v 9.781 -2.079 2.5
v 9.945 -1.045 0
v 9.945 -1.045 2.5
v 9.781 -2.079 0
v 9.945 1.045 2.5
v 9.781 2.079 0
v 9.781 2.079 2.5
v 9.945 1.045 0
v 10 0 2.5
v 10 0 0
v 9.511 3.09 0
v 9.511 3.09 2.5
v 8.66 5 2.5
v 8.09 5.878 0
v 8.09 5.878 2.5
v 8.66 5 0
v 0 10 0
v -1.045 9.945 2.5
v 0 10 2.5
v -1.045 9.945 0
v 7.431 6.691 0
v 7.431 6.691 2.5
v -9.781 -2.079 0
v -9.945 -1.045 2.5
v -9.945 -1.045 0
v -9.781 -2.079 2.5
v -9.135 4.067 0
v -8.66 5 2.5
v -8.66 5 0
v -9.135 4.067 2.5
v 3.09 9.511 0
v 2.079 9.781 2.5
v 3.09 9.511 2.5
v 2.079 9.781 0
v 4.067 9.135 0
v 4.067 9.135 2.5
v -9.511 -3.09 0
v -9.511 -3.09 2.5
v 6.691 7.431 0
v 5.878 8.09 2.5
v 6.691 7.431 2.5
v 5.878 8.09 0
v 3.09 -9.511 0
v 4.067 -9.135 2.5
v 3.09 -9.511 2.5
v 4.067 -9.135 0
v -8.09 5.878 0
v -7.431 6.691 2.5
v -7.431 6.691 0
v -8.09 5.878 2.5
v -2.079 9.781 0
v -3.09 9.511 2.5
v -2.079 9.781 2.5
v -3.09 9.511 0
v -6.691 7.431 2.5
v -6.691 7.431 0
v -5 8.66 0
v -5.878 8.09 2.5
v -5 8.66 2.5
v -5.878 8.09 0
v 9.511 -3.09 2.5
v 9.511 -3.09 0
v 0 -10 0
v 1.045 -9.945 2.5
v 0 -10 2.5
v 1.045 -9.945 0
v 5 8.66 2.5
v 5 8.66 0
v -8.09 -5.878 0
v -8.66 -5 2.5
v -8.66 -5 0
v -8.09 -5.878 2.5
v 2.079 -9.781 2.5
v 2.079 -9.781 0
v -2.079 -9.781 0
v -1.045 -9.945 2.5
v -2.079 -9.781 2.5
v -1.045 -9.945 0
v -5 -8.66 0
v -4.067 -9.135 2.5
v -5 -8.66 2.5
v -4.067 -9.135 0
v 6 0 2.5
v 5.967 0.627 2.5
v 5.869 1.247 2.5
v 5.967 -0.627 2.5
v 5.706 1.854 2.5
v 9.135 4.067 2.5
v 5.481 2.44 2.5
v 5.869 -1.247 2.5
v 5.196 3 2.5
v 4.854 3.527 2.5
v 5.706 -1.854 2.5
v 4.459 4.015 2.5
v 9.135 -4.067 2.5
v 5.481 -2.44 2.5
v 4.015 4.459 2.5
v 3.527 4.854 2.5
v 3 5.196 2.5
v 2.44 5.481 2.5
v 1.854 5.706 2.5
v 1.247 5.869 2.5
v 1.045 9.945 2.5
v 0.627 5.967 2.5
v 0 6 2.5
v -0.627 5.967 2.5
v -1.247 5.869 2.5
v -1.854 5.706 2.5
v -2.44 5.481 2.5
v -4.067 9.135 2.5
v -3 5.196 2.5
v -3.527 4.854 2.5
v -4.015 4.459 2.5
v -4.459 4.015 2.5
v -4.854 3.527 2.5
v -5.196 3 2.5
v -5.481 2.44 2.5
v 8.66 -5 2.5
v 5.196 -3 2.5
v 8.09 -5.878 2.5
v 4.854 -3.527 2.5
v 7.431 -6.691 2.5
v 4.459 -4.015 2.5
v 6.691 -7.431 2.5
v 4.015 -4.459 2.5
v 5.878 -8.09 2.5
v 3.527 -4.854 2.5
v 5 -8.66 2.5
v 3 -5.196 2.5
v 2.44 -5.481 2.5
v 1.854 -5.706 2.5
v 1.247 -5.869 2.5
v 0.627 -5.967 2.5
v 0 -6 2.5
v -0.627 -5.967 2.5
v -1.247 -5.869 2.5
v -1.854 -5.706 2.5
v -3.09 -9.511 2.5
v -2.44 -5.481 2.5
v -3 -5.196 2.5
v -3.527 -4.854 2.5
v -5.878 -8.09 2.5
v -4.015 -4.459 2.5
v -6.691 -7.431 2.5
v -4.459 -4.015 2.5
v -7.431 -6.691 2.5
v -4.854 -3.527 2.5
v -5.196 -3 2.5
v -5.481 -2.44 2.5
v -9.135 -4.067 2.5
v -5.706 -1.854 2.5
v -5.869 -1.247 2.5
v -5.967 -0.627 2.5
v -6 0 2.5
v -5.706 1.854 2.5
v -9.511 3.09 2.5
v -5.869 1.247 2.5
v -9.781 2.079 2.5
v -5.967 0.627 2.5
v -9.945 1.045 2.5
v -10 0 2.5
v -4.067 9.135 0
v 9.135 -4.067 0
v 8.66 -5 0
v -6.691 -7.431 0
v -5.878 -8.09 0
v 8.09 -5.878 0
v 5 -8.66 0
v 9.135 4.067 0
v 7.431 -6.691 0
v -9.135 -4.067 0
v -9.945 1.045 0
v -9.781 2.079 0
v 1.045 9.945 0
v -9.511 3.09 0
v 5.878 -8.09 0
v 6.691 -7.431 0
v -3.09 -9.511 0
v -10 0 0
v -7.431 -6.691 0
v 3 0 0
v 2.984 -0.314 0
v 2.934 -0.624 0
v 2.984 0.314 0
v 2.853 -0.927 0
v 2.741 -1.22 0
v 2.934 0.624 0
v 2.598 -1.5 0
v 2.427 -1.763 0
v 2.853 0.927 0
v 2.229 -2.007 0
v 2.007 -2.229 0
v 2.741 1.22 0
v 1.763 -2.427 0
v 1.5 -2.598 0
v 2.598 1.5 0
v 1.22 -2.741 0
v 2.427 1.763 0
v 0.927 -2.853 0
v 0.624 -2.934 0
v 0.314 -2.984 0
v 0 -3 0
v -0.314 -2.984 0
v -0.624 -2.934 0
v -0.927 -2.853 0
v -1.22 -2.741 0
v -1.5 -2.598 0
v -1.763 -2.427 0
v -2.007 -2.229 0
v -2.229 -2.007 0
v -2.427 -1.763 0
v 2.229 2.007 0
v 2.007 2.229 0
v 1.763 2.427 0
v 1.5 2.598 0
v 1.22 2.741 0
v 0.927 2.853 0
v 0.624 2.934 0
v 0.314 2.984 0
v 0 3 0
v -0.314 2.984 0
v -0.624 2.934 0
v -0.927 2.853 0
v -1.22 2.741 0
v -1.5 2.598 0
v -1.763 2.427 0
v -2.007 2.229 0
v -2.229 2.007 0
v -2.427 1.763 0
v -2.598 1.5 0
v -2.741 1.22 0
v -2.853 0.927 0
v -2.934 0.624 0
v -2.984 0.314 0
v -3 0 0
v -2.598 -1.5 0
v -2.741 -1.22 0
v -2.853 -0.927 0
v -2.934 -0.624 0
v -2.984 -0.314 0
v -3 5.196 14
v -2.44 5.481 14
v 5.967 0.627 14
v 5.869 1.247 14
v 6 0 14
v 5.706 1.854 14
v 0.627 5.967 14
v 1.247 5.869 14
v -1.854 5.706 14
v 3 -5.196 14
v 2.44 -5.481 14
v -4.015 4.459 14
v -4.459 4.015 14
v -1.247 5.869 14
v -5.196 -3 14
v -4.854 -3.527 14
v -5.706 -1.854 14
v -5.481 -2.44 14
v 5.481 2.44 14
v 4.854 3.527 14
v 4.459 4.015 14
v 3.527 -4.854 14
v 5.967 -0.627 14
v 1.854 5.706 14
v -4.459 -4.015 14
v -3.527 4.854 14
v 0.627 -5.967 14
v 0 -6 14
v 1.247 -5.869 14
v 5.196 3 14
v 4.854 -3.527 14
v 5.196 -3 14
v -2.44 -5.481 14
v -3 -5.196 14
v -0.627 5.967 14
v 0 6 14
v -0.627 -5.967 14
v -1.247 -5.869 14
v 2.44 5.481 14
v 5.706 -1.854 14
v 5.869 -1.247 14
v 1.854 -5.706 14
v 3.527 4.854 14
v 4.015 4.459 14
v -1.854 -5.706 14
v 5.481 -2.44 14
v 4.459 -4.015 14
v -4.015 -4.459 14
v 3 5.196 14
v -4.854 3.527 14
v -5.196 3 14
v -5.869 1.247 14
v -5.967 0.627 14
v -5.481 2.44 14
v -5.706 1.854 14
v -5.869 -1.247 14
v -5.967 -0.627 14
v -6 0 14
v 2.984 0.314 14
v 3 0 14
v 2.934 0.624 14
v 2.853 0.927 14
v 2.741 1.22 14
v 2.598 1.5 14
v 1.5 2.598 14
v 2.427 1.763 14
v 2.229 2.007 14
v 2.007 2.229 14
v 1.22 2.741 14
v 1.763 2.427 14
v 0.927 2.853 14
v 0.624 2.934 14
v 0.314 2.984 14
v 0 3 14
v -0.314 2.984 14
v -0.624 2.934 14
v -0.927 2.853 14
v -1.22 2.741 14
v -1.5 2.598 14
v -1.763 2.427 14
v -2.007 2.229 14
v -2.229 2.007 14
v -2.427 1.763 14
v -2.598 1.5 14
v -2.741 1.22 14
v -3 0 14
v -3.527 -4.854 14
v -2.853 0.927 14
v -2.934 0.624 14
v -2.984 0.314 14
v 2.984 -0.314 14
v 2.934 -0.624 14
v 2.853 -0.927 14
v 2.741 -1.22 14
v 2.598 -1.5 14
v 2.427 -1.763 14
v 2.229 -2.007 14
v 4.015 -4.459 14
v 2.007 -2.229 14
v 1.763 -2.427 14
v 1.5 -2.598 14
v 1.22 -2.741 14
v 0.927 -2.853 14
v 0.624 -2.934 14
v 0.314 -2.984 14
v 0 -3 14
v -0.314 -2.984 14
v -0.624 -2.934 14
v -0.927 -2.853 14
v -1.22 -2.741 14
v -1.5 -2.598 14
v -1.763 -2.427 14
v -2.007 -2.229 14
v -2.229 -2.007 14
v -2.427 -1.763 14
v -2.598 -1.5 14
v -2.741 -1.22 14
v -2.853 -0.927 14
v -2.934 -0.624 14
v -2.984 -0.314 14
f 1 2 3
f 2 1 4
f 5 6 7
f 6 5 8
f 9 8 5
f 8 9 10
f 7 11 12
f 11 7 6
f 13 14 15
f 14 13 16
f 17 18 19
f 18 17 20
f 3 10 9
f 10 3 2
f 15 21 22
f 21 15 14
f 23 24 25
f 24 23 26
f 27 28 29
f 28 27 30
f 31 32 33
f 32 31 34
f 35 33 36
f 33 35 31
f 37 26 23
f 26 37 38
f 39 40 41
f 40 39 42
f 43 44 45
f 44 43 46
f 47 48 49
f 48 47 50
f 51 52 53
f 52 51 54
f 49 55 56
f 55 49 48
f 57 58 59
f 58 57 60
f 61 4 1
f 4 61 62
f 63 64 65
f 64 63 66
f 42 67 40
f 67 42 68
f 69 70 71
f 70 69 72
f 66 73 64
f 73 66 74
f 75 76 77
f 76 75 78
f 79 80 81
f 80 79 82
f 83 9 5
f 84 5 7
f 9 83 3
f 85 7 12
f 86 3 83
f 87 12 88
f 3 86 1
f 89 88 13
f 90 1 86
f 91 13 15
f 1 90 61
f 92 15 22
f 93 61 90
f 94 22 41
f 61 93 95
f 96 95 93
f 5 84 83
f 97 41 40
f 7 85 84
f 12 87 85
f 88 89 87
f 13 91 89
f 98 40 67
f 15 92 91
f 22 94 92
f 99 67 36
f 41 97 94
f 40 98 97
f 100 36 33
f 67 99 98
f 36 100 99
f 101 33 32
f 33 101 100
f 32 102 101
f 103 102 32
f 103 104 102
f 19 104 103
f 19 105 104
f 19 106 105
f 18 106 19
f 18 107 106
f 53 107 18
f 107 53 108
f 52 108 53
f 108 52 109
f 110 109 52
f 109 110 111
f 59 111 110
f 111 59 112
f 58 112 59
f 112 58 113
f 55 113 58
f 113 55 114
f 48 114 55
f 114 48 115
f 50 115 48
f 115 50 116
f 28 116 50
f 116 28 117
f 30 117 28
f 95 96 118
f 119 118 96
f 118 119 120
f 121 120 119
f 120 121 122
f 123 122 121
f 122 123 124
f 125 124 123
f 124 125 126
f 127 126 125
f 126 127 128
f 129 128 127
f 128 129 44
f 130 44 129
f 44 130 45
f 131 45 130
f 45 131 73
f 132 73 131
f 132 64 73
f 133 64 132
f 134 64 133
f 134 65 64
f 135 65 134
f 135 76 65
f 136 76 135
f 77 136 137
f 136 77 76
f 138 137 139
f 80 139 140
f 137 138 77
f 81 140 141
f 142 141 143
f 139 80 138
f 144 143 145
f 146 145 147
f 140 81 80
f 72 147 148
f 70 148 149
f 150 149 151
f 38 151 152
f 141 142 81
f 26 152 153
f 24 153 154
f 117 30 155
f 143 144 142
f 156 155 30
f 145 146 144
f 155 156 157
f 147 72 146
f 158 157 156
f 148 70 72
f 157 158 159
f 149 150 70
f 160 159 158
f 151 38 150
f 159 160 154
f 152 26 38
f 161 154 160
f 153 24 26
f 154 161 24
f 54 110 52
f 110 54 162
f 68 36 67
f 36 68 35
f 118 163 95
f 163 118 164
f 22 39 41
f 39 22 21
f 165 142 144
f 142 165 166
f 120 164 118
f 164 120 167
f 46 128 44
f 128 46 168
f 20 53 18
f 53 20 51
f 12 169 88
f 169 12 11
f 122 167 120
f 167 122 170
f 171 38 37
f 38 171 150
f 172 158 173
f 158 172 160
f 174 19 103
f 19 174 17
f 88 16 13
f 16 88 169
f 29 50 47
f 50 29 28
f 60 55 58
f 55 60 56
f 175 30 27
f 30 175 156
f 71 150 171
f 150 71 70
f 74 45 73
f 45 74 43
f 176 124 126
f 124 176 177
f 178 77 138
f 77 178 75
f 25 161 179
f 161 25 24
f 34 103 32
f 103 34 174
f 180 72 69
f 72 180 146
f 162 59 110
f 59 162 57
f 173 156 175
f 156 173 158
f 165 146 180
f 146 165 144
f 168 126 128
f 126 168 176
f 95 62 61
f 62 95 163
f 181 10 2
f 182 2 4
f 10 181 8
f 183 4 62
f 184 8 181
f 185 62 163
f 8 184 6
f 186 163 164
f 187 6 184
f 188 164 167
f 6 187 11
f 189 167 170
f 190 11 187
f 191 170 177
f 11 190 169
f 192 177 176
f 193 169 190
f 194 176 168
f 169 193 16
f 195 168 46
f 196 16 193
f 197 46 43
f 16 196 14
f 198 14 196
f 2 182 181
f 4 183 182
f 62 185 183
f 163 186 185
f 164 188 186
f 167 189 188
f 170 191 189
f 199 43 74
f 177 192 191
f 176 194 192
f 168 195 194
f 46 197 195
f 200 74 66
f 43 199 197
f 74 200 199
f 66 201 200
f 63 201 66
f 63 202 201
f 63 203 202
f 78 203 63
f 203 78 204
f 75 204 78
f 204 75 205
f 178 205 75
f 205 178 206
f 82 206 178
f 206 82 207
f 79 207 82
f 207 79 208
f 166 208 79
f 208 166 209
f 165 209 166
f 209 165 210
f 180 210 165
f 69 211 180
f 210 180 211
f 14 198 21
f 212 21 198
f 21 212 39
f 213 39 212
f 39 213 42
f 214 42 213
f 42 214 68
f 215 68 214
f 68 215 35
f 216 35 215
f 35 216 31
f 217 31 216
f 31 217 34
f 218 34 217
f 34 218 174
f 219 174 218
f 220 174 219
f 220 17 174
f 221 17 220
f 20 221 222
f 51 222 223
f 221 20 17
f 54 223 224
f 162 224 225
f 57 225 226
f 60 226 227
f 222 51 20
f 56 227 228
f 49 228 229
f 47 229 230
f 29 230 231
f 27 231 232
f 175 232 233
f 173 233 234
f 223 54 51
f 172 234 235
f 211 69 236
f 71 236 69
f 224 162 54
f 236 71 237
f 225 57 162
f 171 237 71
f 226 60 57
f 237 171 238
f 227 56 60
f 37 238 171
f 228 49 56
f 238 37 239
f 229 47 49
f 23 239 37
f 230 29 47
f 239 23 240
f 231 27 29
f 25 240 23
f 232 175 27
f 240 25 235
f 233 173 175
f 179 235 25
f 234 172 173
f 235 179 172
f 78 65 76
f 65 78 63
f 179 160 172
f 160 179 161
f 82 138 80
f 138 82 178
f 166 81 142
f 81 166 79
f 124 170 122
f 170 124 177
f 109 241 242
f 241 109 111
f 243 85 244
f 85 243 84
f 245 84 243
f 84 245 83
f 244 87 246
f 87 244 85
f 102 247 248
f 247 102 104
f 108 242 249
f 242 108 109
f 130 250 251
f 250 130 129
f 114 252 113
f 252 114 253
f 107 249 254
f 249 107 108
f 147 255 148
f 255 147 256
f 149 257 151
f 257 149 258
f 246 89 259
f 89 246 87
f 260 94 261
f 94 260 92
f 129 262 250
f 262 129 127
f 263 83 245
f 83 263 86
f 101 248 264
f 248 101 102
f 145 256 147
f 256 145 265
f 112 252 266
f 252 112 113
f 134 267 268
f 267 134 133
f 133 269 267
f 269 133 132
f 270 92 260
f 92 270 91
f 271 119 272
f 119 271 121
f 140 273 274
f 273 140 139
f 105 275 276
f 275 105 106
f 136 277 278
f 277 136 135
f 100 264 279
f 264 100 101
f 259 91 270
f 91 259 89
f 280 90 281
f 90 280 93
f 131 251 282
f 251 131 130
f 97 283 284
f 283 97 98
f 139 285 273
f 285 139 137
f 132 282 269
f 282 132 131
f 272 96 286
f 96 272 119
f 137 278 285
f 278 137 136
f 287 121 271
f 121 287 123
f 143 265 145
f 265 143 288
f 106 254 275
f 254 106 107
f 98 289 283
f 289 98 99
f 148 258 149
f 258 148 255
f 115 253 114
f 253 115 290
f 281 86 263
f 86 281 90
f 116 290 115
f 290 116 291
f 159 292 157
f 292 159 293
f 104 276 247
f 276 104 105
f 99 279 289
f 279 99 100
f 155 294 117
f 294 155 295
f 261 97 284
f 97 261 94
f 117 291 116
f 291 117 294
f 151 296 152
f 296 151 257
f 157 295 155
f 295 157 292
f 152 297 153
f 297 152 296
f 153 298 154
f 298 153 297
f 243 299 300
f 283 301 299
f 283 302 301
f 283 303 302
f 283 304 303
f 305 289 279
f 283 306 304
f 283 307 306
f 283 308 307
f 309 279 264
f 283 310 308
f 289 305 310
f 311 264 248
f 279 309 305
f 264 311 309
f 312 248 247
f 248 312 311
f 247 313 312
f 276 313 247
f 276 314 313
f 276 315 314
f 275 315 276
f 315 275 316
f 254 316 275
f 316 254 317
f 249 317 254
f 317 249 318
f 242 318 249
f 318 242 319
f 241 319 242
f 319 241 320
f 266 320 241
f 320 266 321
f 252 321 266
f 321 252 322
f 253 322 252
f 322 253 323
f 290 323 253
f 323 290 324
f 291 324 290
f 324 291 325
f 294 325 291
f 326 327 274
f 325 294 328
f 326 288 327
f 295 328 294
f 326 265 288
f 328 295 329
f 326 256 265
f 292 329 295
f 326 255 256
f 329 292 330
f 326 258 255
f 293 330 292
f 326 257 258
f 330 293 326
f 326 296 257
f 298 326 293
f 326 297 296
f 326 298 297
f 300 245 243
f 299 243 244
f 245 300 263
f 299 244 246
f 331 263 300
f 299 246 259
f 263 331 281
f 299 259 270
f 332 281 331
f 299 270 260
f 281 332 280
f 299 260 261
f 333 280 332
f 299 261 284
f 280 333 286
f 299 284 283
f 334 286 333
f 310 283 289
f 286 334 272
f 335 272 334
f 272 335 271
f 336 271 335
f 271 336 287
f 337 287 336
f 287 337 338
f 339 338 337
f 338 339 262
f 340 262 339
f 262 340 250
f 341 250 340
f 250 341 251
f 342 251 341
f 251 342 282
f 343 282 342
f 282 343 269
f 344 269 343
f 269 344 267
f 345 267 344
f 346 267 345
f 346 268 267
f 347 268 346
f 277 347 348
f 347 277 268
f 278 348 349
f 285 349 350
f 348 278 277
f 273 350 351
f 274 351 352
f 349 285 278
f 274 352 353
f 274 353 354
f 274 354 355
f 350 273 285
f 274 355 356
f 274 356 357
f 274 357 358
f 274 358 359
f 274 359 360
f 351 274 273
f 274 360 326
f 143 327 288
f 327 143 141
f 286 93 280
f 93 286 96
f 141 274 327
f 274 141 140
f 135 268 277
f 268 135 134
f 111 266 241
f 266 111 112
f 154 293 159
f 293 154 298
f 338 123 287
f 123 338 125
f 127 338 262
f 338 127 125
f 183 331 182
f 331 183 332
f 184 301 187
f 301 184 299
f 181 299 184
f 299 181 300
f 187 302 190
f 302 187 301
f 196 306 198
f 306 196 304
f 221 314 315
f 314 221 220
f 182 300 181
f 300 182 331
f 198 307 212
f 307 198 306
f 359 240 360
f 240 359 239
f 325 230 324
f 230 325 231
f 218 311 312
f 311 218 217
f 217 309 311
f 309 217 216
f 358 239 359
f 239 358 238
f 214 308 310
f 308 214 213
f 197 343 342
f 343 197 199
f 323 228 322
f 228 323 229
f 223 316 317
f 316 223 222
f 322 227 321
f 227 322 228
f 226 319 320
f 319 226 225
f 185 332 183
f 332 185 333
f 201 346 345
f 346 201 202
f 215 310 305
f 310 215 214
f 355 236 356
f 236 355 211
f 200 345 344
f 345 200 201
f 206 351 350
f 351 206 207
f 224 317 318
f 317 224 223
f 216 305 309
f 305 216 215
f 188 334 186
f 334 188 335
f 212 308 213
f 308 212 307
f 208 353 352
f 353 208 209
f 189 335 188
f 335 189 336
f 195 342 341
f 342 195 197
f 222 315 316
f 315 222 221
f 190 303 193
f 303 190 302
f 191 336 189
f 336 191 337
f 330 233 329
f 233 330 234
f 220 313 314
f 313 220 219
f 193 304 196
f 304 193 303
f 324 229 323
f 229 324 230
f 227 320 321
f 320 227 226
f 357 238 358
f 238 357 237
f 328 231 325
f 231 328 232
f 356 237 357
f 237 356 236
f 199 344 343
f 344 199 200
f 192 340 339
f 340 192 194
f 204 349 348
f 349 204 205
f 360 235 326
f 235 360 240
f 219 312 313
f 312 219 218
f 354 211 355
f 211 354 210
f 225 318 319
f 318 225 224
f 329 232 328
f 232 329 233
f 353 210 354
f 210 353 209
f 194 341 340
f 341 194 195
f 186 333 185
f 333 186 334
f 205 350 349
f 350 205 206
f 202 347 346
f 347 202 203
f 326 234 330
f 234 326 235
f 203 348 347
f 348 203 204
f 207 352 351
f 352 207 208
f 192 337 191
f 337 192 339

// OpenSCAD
// Flanged sleeve bushing.
$fn = 60;
eps = 0.02;
inner_d = 6;
outer_d = 12;
length = 14;
flange_d = 20;
flange_t = 2.5;
difference() {
    union() {
        cylinder(d = flange_d, h = flange_t);
        cylinder(d = outer_d, h = length);
    }
    translate([0, 0, -eps]) cylinder(d = inner_d, h = length + 2 * eps);
}
